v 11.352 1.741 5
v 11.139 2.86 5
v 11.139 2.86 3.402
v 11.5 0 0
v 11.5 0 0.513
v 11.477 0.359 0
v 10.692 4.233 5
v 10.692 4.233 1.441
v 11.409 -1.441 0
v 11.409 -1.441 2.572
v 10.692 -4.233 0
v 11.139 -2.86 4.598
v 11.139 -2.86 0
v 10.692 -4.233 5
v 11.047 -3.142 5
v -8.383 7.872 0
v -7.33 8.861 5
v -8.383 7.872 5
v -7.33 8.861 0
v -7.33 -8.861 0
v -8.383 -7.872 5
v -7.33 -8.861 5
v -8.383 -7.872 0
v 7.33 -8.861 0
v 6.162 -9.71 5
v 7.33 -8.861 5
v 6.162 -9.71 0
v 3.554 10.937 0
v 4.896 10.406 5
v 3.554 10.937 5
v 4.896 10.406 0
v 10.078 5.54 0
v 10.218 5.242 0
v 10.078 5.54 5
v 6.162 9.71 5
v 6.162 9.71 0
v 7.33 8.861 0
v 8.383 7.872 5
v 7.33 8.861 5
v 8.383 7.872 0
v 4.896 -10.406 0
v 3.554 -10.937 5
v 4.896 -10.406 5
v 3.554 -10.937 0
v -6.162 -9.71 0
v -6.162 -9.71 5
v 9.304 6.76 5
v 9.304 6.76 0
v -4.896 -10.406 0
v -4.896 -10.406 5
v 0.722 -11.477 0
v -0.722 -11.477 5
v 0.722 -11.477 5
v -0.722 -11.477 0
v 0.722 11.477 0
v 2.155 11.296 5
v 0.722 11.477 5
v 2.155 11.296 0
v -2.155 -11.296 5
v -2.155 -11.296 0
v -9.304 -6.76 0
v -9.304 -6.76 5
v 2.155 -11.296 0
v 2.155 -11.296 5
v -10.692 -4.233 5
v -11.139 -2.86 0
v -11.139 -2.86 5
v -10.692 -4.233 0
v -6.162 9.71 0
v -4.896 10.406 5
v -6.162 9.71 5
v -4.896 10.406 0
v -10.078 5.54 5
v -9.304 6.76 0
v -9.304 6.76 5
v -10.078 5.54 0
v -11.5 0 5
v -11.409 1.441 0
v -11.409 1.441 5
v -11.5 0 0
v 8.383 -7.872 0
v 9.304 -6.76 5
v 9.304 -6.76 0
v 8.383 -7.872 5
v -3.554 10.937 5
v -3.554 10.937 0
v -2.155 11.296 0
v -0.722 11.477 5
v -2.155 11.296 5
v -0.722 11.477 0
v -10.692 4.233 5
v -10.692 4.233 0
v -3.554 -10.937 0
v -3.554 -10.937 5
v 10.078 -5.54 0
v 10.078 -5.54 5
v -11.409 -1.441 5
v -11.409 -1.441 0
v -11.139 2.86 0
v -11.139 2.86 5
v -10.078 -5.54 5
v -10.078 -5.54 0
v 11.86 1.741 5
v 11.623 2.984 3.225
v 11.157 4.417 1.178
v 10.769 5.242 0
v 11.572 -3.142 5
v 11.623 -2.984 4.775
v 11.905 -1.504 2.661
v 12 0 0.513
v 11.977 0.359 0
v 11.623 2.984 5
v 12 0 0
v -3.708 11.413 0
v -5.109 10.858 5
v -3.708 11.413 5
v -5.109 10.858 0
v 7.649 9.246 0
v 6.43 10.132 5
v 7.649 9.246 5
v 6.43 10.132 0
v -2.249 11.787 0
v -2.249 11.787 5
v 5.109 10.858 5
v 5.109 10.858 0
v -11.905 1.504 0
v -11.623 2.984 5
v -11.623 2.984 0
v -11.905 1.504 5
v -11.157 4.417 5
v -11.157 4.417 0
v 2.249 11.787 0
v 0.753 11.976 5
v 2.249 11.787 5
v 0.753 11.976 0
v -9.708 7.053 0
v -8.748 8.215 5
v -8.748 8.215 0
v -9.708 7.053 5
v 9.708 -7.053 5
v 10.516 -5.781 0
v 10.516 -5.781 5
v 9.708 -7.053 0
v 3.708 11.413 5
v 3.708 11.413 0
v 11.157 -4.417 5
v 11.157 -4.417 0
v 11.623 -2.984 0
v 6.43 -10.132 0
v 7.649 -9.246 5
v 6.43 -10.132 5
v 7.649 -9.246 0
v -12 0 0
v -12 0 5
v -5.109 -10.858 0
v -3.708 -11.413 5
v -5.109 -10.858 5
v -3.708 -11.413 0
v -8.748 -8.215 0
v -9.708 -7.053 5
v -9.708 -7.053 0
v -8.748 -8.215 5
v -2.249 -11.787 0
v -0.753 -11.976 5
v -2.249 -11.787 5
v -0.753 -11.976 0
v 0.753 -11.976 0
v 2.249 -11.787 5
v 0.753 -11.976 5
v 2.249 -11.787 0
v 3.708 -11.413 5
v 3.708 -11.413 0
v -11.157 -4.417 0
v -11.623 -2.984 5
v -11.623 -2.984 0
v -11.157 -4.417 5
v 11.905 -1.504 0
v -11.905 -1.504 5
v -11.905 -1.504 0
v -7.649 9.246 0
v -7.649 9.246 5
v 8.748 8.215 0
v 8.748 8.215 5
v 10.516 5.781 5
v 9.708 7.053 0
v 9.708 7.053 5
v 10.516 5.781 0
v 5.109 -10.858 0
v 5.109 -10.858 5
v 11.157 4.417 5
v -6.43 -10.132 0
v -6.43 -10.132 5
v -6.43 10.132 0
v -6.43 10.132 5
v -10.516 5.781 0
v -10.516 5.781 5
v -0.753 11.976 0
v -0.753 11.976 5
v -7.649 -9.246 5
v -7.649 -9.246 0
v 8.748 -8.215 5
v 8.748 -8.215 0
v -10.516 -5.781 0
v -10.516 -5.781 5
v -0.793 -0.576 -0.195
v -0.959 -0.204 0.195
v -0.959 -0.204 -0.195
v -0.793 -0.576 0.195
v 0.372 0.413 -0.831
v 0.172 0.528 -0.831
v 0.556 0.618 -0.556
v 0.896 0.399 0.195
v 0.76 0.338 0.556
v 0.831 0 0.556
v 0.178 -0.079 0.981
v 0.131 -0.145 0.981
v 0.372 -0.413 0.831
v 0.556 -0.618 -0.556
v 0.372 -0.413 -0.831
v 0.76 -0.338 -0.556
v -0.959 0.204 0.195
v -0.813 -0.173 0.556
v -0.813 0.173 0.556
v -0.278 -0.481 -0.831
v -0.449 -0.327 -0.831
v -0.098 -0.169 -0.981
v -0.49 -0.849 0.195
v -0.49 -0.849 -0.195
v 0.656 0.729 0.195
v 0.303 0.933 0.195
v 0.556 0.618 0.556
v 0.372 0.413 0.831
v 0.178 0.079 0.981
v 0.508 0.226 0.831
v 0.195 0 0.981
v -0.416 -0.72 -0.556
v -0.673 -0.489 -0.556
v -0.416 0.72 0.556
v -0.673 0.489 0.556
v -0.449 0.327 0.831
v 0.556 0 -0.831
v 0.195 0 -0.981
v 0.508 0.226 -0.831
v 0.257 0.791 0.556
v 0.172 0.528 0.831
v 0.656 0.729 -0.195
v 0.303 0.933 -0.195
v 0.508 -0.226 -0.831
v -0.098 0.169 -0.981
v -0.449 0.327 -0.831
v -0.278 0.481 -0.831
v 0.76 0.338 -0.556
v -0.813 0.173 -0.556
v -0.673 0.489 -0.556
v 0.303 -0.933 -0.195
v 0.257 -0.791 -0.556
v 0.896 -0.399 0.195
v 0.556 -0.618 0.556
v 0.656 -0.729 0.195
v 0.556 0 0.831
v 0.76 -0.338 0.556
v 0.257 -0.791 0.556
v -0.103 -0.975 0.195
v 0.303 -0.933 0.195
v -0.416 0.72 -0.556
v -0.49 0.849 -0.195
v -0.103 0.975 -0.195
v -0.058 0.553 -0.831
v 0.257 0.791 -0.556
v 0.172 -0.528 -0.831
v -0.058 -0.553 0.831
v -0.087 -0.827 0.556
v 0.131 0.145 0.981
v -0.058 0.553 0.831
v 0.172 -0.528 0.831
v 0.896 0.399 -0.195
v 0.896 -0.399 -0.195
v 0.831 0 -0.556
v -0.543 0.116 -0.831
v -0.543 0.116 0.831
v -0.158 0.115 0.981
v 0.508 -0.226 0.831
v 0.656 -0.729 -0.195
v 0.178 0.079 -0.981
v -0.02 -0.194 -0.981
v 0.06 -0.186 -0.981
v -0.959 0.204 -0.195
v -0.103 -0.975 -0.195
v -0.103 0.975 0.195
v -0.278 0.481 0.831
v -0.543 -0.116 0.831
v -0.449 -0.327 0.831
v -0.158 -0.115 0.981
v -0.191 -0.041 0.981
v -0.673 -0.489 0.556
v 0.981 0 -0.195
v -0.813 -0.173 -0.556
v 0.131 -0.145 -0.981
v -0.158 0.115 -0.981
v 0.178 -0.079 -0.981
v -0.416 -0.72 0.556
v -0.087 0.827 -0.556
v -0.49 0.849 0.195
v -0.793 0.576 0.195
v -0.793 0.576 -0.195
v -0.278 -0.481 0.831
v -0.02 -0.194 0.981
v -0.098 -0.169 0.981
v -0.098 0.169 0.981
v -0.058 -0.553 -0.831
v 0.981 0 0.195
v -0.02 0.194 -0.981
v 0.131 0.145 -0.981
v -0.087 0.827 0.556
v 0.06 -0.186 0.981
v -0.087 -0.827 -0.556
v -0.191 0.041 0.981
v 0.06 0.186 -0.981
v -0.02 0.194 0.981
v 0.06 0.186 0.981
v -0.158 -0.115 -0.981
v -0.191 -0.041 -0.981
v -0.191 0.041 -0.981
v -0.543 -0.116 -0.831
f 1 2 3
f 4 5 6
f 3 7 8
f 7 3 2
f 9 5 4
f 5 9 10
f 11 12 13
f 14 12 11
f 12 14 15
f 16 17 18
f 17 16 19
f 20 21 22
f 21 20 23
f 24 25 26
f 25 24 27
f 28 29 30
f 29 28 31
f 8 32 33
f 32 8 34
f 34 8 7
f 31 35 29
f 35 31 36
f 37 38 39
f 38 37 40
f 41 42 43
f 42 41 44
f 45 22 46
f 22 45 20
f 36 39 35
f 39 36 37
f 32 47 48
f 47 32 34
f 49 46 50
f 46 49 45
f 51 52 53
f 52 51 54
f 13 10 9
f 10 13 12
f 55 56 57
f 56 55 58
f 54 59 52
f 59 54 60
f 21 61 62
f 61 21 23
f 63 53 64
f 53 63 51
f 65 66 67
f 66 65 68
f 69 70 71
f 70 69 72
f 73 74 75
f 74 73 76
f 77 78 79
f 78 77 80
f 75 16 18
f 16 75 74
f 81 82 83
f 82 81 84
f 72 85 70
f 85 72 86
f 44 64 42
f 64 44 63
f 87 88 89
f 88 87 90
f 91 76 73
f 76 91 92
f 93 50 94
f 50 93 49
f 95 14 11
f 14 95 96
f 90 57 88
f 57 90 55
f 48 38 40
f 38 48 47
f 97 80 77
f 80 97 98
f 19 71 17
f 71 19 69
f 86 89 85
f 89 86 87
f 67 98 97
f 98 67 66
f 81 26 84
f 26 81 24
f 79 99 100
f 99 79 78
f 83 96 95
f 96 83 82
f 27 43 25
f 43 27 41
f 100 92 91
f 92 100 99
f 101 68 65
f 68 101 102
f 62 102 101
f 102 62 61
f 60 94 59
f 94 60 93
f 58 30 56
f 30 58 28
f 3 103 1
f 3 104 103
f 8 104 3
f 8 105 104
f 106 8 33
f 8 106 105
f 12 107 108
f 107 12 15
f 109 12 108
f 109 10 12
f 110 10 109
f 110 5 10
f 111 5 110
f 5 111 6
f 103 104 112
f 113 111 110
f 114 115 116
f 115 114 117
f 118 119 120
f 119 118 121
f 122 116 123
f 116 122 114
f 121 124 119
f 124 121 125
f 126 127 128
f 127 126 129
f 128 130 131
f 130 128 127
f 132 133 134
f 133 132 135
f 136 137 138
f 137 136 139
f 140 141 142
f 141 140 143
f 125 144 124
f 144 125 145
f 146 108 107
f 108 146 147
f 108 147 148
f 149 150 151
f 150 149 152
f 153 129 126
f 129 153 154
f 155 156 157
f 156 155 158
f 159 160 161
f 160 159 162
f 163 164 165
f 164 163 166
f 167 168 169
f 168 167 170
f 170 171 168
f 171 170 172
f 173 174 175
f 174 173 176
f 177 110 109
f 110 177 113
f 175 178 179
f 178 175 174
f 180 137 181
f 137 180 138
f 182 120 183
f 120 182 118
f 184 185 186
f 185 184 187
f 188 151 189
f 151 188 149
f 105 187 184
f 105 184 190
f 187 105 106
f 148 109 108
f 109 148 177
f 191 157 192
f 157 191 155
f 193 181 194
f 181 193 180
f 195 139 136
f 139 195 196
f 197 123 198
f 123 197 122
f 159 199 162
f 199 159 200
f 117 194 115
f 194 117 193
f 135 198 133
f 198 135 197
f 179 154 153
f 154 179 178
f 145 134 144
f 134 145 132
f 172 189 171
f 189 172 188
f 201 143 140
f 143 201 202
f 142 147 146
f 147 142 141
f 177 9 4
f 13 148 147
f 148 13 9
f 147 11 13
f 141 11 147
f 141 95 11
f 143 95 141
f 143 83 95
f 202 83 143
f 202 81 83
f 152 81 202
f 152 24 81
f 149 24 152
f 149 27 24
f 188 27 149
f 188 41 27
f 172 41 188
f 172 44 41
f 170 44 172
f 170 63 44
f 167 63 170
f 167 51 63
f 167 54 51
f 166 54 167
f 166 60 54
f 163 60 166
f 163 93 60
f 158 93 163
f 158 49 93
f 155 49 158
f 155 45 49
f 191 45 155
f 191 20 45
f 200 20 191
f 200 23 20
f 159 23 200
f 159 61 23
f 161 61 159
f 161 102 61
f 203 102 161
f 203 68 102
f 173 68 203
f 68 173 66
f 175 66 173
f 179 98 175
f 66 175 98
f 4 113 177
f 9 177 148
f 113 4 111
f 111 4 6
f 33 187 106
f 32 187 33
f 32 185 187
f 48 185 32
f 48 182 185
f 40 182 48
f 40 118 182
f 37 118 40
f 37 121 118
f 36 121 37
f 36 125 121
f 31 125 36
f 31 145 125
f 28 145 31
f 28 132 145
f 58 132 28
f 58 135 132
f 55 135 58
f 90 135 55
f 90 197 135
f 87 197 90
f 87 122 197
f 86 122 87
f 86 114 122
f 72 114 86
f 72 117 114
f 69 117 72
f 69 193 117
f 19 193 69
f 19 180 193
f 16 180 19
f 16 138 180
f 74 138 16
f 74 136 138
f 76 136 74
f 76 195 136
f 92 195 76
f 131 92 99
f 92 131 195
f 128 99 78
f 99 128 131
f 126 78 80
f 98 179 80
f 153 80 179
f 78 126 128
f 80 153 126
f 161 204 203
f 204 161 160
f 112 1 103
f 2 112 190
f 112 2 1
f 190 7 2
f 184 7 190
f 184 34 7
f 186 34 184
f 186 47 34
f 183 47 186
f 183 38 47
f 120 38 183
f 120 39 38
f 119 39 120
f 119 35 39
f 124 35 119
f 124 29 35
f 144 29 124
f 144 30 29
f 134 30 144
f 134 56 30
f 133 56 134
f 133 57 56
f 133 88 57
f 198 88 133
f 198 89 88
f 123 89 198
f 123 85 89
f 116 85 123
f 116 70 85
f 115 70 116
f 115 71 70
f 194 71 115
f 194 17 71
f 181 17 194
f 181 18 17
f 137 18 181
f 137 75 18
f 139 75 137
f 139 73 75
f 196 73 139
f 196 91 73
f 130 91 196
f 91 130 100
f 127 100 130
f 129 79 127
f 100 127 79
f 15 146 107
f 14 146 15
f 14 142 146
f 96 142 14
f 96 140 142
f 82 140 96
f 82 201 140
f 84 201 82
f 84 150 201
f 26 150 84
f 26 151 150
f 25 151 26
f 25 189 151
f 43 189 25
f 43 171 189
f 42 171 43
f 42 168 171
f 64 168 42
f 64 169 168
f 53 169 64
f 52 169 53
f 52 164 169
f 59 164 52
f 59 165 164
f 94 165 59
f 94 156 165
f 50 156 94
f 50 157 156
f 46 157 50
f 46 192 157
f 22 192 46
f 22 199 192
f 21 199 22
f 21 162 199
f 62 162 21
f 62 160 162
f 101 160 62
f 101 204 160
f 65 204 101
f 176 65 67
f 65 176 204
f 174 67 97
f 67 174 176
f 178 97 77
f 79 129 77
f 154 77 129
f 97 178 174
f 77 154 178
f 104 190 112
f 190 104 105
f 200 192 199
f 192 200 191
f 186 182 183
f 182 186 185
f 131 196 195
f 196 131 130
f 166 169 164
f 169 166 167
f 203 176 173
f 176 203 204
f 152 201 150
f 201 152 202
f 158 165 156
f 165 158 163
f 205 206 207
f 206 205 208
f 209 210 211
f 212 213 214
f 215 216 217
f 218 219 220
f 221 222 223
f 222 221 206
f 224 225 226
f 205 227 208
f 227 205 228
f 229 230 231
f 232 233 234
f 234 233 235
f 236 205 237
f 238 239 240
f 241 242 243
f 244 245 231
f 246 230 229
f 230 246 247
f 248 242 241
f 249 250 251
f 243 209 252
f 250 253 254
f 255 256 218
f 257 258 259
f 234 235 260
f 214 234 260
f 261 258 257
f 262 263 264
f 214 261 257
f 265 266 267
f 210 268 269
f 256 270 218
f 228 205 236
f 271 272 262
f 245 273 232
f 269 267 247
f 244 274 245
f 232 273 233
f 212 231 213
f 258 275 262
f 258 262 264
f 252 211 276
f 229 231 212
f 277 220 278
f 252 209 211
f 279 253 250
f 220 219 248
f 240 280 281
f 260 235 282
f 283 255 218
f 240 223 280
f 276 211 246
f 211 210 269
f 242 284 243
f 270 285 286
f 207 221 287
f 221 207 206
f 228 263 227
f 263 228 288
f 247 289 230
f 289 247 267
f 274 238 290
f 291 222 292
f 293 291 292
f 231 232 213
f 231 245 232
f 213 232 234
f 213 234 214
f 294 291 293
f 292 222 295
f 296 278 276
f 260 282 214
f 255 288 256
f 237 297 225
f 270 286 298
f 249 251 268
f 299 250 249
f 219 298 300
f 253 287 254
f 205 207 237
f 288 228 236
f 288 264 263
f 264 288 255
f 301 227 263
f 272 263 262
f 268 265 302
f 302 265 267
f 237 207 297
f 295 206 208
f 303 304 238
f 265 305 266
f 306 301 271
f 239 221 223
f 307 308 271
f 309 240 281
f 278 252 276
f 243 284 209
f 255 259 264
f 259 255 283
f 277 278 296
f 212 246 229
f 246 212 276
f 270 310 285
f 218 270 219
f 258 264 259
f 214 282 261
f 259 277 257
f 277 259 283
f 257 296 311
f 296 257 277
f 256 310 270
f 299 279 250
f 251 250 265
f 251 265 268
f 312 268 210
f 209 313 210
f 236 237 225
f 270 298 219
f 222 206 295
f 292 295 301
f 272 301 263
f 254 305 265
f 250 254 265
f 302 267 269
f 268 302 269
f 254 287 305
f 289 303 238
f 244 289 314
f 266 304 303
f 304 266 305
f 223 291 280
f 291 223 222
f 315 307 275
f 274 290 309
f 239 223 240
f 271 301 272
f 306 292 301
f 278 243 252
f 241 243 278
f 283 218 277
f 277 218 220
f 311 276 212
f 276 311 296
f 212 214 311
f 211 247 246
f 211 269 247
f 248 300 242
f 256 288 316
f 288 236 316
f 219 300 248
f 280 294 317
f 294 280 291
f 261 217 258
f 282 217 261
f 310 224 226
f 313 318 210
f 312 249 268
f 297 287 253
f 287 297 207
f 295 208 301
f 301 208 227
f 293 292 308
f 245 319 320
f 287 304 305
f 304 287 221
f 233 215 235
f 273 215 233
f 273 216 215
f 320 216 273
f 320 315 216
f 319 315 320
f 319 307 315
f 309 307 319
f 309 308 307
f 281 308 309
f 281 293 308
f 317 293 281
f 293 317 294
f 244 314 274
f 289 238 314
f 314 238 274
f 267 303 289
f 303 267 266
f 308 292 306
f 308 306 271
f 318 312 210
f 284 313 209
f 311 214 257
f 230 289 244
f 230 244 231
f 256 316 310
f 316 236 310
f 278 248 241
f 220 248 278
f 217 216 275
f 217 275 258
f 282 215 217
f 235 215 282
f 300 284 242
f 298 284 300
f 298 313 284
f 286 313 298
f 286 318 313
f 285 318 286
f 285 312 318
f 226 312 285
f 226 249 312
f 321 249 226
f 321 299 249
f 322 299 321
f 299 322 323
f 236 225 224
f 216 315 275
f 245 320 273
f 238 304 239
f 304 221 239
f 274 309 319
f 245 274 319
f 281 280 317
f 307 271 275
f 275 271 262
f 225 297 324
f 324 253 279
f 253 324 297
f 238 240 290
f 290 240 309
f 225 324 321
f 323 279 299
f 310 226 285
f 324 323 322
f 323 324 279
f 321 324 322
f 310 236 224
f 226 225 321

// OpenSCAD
$fn=50;


color("silver")
//minkowski(){
    difference(){
        cylinder(r=12,h=5);
        
        translate([0,0,-1]){
        cylinder(r=11.5,h=12);
            
        translate([0,0,5])
        rotate([35,0,0])
        translate([0,-2,-20])
        cube([40,4,40]);
        }
    }
    //cylinder(r=2,h=1);
    
    sphere(r=1, $fn=15);
//}


            
